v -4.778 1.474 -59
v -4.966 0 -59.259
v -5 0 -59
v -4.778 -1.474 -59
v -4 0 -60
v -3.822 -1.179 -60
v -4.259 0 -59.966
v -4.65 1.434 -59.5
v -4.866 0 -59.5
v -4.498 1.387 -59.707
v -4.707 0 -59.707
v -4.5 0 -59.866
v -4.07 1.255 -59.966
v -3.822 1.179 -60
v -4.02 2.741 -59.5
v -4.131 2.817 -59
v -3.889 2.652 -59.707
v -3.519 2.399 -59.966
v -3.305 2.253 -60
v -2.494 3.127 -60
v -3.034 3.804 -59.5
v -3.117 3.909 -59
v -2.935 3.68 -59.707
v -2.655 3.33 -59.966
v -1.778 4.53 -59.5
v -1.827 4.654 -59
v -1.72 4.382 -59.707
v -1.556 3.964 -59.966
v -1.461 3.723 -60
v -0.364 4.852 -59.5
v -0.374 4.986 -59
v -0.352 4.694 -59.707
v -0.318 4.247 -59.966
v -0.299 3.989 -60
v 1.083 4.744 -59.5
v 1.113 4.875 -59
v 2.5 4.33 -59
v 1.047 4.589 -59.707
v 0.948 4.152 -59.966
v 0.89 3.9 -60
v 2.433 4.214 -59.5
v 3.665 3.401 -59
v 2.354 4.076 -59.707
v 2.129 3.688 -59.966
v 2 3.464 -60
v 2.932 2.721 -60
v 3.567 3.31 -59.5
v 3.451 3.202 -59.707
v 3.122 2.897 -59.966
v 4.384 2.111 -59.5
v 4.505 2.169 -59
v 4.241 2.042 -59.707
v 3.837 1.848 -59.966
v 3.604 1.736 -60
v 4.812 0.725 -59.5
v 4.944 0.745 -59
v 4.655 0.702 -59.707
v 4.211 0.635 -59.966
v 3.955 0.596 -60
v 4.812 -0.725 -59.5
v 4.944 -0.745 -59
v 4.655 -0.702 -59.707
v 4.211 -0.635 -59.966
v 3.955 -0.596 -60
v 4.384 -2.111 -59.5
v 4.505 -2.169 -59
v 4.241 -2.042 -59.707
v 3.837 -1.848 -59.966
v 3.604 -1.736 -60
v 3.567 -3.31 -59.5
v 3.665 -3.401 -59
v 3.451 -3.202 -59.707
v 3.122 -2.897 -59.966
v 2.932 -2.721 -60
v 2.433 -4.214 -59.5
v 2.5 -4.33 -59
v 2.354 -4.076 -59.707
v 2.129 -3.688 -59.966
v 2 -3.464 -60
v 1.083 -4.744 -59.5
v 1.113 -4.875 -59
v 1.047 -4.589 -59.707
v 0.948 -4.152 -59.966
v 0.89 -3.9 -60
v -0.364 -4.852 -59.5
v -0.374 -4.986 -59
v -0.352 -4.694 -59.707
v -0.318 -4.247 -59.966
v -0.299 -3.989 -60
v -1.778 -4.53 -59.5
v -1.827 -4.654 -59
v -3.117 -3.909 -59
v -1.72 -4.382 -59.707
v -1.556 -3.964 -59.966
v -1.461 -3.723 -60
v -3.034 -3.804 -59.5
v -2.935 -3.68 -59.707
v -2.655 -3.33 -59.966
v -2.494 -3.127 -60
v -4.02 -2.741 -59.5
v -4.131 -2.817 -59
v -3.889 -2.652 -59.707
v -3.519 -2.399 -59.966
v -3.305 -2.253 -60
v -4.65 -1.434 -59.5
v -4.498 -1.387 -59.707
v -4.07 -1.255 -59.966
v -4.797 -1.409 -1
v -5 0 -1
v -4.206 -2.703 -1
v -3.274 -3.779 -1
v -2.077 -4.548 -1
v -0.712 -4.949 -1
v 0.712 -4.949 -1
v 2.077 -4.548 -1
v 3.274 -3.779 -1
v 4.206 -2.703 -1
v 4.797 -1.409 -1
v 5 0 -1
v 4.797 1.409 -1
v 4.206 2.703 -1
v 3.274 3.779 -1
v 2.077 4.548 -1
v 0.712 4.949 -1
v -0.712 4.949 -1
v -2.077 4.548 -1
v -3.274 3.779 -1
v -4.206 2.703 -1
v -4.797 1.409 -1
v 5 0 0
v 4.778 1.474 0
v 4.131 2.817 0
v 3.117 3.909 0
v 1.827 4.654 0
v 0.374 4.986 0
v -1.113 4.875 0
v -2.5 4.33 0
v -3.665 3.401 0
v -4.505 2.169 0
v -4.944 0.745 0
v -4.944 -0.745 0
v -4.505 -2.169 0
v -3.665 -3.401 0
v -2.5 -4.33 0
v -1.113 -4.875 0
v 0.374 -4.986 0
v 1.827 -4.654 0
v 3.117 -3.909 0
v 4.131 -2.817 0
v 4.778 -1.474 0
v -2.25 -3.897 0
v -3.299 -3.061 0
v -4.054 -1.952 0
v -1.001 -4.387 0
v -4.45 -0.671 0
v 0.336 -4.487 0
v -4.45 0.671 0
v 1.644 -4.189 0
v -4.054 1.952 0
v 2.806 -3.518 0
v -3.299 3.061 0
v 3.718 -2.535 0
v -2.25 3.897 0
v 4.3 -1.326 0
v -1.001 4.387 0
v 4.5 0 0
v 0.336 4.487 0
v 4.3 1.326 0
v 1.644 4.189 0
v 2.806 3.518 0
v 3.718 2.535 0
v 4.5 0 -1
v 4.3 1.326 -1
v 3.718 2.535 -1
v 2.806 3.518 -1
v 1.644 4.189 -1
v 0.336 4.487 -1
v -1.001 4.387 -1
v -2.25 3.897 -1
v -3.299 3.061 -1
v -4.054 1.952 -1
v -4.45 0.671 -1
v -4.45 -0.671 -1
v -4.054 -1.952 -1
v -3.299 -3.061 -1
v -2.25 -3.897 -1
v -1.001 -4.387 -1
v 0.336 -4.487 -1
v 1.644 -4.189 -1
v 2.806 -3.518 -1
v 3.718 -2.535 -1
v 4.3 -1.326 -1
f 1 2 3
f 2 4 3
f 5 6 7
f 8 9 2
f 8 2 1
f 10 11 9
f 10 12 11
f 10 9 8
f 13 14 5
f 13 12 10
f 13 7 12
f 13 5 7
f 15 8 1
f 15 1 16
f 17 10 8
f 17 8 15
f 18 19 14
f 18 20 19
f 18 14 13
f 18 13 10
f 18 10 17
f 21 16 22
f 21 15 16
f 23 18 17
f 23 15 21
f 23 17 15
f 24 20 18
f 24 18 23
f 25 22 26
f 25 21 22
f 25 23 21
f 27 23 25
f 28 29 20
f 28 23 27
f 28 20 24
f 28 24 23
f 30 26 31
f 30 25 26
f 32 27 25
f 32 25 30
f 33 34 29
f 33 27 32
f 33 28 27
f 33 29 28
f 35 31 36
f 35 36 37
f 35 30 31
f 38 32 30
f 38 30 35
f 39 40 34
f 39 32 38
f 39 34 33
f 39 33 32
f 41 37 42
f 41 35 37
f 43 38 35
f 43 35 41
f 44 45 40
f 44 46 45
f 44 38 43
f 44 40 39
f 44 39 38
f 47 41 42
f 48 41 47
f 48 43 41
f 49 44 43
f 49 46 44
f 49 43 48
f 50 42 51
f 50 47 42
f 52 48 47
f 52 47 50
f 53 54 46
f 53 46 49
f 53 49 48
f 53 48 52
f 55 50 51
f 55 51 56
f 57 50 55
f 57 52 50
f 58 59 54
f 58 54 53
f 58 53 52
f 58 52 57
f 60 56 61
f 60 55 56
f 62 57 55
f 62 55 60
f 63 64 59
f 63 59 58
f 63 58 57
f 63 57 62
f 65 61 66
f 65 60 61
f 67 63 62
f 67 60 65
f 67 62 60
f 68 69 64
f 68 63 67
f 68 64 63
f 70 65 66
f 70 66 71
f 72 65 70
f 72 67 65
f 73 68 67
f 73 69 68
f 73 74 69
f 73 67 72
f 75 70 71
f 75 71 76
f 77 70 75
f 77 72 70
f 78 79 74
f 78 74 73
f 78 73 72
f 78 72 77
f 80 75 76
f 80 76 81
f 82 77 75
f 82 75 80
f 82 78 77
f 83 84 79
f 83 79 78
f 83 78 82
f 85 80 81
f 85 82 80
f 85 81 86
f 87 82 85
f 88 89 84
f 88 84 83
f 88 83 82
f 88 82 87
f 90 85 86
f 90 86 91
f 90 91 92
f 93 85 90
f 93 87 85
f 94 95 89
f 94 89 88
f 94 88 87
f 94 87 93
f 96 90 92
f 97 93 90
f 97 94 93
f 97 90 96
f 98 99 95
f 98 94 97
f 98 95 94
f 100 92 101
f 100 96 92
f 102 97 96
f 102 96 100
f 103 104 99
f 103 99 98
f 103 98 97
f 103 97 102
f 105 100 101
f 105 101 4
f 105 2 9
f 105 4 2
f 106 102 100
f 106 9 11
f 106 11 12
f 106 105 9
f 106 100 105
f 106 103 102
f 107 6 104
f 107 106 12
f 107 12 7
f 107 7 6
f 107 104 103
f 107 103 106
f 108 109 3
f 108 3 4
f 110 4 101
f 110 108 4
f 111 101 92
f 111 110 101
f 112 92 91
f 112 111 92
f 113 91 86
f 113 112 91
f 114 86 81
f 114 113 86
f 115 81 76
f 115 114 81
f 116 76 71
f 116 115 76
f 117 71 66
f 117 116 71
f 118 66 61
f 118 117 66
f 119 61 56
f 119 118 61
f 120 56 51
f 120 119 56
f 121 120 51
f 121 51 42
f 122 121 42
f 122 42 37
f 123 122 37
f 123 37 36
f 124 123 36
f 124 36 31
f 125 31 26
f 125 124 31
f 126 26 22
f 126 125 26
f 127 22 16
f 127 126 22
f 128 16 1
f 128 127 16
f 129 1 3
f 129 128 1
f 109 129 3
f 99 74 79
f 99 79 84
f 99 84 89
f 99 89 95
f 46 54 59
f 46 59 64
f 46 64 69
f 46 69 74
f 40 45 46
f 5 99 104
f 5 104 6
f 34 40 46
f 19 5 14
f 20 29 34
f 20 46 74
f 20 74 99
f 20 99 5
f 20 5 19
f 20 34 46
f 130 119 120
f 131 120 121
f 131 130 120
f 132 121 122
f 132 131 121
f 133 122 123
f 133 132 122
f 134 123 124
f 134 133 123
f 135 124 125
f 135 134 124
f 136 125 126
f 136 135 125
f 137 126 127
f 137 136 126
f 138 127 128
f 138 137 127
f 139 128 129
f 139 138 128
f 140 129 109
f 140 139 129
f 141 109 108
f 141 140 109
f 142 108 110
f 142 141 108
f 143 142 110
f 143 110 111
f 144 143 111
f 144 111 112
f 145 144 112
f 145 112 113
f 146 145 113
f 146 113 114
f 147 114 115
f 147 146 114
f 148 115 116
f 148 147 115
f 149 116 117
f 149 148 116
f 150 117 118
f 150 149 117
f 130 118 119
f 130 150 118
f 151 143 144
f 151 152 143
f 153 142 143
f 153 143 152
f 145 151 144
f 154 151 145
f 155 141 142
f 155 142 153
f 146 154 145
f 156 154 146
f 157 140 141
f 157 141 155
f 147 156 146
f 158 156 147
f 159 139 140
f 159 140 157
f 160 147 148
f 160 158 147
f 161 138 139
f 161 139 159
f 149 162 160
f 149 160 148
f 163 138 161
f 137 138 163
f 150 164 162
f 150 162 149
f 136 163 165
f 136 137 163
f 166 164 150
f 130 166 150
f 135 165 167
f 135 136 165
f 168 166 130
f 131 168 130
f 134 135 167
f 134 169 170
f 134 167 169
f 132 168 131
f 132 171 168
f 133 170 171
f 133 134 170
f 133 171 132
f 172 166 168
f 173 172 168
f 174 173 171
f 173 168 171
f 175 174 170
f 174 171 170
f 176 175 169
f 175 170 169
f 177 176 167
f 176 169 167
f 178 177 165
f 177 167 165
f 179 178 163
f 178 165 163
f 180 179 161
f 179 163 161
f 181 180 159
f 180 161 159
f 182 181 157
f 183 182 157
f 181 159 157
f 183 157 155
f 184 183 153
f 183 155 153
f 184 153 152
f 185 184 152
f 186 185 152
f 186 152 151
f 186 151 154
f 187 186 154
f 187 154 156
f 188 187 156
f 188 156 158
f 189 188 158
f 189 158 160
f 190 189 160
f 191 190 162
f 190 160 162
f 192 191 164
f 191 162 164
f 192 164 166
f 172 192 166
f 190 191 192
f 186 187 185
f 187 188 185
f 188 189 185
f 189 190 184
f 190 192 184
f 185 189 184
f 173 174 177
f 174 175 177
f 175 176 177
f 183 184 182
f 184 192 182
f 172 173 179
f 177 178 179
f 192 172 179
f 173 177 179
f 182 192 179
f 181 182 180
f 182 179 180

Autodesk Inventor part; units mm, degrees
ref_plane "YZ Plane" through (0, 0, 0) normal (1, 0, 0) x (0, 1, 0)
ref_plane "XZ Plane" through (0, 0, 0) normal (0, 1, 0) x (-1, 0, 0)
sketch "スケッチ1" plane through (0, 0, 0) normal (0, 0, 1) x (1, 0, 0)
  circle A0 centre (0, 0) radius 5
  circle A1 centre (0, 0) radius 4.5
  dimension "d0" = 10
  dimension "d10" = 9
ref_plane "作業平面1" through (0, 0, 0) normal (0, 0, -1) x (-1, 0, 0)
extrude "押し出し5" add sketch "スケッチ1" against normal blind 1
sketch "スケッチ3" plane through (0, 0, -1) normal (0, 0, -1) x (-1, 0, 0)
  circle A0 centre (0, 0) radius 5
extrude "押し出し6" add sketch "スケッチ3" along normal blind 59
fillet "フィレット2" radius 1 1 edges at (5, 0, -60)
properties part number "ueda_hanko_3D プリント"
